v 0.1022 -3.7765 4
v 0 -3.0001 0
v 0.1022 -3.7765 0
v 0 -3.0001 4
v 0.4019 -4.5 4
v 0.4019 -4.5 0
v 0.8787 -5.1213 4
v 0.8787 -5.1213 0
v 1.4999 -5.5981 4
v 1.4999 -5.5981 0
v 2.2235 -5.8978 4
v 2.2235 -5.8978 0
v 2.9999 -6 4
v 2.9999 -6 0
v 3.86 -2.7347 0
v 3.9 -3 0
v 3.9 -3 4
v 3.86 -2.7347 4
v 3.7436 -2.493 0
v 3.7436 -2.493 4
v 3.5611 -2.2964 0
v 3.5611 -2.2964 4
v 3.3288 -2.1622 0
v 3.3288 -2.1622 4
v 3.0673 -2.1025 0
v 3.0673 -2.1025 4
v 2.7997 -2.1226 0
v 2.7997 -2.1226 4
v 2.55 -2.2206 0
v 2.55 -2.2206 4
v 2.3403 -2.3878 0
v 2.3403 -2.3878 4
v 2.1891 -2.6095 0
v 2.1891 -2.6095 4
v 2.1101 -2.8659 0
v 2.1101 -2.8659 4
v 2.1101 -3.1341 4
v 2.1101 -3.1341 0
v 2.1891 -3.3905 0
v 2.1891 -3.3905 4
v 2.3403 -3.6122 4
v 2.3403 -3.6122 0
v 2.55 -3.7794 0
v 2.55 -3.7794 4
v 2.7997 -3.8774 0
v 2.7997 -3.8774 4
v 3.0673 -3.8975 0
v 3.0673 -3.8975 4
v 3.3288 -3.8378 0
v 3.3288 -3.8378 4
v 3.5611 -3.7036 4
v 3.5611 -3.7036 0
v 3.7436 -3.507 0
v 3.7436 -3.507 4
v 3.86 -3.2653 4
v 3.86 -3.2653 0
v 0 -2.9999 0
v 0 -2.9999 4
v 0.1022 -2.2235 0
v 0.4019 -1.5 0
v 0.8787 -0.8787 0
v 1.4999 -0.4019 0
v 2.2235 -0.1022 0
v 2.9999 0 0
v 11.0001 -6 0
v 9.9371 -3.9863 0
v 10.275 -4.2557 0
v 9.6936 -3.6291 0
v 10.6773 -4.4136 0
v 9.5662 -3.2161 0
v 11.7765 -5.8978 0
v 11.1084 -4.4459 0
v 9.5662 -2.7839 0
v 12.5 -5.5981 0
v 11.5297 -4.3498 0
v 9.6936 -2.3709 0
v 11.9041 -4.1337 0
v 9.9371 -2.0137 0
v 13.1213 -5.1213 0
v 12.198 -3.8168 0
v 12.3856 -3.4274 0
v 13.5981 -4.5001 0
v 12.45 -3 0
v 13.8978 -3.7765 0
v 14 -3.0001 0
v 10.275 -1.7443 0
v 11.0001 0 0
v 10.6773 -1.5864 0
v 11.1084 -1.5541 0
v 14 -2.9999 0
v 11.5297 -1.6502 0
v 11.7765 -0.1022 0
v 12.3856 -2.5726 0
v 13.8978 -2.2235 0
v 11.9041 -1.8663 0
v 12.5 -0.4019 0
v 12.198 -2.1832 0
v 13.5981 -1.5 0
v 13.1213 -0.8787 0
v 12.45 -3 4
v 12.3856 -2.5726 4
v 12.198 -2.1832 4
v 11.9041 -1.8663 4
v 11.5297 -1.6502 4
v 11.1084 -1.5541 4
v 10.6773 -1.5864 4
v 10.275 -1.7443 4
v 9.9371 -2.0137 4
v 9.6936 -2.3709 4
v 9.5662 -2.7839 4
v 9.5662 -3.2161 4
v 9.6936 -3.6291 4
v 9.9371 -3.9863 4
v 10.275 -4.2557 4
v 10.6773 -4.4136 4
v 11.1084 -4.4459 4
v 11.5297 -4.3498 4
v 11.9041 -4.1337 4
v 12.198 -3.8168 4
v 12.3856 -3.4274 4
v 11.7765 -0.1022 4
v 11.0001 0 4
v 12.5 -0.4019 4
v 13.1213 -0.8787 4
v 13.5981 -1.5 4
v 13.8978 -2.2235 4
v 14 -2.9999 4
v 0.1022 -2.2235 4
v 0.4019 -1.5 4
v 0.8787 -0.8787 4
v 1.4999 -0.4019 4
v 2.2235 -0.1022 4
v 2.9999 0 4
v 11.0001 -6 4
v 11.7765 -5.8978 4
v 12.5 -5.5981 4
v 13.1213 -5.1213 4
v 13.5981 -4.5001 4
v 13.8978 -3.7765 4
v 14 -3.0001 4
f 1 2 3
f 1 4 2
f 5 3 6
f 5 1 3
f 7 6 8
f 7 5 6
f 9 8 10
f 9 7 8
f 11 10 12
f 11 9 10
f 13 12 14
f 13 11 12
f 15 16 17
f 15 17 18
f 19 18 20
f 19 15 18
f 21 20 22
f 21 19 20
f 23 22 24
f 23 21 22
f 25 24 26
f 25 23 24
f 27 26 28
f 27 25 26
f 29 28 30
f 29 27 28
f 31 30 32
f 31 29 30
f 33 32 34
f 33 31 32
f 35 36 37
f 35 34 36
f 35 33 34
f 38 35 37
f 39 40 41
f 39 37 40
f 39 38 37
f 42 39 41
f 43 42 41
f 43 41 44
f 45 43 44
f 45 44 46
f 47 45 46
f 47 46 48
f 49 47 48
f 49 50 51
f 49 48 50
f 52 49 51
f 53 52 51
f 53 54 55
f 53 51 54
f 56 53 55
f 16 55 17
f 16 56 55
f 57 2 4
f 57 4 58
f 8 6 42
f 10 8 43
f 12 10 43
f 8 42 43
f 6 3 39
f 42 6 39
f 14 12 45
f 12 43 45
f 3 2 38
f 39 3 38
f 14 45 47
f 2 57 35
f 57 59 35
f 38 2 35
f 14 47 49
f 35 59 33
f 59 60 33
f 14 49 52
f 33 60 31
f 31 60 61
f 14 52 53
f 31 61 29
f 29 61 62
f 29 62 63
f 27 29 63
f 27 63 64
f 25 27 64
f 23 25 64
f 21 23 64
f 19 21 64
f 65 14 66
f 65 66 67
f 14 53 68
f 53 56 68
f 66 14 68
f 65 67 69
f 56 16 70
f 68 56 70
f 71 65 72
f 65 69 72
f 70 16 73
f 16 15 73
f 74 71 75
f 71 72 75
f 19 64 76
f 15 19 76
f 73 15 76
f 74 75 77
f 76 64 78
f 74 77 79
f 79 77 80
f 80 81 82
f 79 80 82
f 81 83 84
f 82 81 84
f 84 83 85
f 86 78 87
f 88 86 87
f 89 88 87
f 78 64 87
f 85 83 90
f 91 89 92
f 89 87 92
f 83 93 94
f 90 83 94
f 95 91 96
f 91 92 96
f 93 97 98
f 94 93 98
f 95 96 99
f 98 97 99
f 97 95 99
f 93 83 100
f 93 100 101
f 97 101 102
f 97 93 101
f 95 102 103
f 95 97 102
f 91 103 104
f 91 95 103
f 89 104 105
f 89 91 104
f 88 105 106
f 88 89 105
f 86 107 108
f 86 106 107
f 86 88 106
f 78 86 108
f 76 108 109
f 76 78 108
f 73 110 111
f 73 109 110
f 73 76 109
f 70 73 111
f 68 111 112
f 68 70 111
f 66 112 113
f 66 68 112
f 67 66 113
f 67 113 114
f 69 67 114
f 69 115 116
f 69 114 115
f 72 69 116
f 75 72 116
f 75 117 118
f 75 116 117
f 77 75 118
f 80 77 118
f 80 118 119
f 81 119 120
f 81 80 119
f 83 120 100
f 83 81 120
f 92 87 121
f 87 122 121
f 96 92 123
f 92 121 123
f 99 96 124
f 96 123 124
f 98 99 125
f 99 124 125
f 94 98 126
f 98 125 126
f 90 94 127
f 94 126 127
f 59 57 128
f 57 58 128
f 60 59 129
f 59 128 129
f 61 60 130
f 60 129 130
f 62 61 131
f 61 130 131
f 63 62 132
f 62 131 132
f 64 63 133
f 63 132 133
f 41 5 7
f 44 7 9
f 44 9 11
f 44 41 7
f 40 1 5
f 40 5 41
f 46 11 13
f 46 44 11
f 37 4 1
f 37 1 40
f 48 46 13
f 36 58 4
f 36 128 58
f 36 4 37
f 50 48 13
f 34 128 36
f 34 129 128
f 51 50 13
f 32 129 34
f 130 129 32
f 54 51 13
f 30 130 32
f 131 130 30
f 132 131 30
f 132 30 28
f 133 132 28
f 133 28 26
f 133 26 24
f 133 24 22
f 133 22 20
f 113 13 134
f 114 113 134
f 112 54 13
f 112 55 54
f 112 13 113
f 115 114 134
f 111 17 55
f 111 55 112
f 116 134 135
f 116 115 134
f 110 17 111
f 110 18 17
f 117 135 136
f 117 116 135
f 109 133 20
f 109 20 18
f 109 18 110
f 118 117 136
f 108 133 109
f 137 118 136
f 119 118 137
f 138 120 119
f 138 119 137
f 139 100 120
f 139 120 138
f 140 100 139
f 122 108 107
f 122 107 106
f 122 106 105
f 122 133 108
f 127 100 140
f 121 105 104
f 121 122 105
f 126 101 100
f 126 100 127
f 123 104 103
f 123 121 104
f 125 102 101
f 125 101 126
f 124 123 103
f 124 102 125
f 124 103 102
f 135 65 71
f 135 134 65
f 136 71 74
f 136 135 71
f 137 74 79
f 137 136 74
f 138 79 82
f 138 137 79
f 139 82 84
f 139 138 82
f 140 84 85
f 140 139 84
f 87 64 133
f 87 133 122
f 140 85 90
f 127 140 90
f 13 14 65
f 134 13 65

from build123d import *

# Parameters (mm, degrees)
SKETCH1_W               = 14
SKETCH1_H               = 6
BOSS_EXTRUDE1_DEPTH     = 4
CUT_EXTRUDE1_DEPTH      = 16.748015748
CUT_EXTRUDE1_DEPTH_BACK = 16.748015748
SKETCH2_R               = 0.9
SKETCH2_R_2             = 1.45
FILLET1_R               = 3


with BuildPart() as part:
    # Sketch1 → Boss-Extrude1 (new body)
    with BuildSketch(Plane.XY):
        with Locations((7, -3)):
            Rectangle(SKETCH1_W, SKETCH1_H)
    extrude(amount=BOSS_EXTRUDE1_DEPTH)

    # Sketch2 → Cut-Extrude1 (cut, two sides: drawn at the far end of the back side and taken through both)
    with BuildSketch(Plane.XY.offset(4).offset(-CUT_EXTRUDE1_DEPTH_BACK)):
        with Locations((3, -3)):
            Circle(SKETCH2_R)
        with Locations((11, -3)):
            Circle(SKETCH2_R_2)
    extrude(amount=CUT_EXTRUDE1_DEPTH + CUT_EXTRUDE1_DEPTH_BACK, mode=Mode.SUBTRACT)

    # Fillet1
    fillet1_edges = [part.edges().sort_by_distance(p)[0] for p in [
        (14, -6, 2),
        (14, 0, 2),
        (0, -6, 2),
        (0, 0, 2),
    ]]
    fillet(fillet1_edges, radius=FILLET1_R - 0.0001)  # a hair under: the kernel refuses the full size


solid = part.part
